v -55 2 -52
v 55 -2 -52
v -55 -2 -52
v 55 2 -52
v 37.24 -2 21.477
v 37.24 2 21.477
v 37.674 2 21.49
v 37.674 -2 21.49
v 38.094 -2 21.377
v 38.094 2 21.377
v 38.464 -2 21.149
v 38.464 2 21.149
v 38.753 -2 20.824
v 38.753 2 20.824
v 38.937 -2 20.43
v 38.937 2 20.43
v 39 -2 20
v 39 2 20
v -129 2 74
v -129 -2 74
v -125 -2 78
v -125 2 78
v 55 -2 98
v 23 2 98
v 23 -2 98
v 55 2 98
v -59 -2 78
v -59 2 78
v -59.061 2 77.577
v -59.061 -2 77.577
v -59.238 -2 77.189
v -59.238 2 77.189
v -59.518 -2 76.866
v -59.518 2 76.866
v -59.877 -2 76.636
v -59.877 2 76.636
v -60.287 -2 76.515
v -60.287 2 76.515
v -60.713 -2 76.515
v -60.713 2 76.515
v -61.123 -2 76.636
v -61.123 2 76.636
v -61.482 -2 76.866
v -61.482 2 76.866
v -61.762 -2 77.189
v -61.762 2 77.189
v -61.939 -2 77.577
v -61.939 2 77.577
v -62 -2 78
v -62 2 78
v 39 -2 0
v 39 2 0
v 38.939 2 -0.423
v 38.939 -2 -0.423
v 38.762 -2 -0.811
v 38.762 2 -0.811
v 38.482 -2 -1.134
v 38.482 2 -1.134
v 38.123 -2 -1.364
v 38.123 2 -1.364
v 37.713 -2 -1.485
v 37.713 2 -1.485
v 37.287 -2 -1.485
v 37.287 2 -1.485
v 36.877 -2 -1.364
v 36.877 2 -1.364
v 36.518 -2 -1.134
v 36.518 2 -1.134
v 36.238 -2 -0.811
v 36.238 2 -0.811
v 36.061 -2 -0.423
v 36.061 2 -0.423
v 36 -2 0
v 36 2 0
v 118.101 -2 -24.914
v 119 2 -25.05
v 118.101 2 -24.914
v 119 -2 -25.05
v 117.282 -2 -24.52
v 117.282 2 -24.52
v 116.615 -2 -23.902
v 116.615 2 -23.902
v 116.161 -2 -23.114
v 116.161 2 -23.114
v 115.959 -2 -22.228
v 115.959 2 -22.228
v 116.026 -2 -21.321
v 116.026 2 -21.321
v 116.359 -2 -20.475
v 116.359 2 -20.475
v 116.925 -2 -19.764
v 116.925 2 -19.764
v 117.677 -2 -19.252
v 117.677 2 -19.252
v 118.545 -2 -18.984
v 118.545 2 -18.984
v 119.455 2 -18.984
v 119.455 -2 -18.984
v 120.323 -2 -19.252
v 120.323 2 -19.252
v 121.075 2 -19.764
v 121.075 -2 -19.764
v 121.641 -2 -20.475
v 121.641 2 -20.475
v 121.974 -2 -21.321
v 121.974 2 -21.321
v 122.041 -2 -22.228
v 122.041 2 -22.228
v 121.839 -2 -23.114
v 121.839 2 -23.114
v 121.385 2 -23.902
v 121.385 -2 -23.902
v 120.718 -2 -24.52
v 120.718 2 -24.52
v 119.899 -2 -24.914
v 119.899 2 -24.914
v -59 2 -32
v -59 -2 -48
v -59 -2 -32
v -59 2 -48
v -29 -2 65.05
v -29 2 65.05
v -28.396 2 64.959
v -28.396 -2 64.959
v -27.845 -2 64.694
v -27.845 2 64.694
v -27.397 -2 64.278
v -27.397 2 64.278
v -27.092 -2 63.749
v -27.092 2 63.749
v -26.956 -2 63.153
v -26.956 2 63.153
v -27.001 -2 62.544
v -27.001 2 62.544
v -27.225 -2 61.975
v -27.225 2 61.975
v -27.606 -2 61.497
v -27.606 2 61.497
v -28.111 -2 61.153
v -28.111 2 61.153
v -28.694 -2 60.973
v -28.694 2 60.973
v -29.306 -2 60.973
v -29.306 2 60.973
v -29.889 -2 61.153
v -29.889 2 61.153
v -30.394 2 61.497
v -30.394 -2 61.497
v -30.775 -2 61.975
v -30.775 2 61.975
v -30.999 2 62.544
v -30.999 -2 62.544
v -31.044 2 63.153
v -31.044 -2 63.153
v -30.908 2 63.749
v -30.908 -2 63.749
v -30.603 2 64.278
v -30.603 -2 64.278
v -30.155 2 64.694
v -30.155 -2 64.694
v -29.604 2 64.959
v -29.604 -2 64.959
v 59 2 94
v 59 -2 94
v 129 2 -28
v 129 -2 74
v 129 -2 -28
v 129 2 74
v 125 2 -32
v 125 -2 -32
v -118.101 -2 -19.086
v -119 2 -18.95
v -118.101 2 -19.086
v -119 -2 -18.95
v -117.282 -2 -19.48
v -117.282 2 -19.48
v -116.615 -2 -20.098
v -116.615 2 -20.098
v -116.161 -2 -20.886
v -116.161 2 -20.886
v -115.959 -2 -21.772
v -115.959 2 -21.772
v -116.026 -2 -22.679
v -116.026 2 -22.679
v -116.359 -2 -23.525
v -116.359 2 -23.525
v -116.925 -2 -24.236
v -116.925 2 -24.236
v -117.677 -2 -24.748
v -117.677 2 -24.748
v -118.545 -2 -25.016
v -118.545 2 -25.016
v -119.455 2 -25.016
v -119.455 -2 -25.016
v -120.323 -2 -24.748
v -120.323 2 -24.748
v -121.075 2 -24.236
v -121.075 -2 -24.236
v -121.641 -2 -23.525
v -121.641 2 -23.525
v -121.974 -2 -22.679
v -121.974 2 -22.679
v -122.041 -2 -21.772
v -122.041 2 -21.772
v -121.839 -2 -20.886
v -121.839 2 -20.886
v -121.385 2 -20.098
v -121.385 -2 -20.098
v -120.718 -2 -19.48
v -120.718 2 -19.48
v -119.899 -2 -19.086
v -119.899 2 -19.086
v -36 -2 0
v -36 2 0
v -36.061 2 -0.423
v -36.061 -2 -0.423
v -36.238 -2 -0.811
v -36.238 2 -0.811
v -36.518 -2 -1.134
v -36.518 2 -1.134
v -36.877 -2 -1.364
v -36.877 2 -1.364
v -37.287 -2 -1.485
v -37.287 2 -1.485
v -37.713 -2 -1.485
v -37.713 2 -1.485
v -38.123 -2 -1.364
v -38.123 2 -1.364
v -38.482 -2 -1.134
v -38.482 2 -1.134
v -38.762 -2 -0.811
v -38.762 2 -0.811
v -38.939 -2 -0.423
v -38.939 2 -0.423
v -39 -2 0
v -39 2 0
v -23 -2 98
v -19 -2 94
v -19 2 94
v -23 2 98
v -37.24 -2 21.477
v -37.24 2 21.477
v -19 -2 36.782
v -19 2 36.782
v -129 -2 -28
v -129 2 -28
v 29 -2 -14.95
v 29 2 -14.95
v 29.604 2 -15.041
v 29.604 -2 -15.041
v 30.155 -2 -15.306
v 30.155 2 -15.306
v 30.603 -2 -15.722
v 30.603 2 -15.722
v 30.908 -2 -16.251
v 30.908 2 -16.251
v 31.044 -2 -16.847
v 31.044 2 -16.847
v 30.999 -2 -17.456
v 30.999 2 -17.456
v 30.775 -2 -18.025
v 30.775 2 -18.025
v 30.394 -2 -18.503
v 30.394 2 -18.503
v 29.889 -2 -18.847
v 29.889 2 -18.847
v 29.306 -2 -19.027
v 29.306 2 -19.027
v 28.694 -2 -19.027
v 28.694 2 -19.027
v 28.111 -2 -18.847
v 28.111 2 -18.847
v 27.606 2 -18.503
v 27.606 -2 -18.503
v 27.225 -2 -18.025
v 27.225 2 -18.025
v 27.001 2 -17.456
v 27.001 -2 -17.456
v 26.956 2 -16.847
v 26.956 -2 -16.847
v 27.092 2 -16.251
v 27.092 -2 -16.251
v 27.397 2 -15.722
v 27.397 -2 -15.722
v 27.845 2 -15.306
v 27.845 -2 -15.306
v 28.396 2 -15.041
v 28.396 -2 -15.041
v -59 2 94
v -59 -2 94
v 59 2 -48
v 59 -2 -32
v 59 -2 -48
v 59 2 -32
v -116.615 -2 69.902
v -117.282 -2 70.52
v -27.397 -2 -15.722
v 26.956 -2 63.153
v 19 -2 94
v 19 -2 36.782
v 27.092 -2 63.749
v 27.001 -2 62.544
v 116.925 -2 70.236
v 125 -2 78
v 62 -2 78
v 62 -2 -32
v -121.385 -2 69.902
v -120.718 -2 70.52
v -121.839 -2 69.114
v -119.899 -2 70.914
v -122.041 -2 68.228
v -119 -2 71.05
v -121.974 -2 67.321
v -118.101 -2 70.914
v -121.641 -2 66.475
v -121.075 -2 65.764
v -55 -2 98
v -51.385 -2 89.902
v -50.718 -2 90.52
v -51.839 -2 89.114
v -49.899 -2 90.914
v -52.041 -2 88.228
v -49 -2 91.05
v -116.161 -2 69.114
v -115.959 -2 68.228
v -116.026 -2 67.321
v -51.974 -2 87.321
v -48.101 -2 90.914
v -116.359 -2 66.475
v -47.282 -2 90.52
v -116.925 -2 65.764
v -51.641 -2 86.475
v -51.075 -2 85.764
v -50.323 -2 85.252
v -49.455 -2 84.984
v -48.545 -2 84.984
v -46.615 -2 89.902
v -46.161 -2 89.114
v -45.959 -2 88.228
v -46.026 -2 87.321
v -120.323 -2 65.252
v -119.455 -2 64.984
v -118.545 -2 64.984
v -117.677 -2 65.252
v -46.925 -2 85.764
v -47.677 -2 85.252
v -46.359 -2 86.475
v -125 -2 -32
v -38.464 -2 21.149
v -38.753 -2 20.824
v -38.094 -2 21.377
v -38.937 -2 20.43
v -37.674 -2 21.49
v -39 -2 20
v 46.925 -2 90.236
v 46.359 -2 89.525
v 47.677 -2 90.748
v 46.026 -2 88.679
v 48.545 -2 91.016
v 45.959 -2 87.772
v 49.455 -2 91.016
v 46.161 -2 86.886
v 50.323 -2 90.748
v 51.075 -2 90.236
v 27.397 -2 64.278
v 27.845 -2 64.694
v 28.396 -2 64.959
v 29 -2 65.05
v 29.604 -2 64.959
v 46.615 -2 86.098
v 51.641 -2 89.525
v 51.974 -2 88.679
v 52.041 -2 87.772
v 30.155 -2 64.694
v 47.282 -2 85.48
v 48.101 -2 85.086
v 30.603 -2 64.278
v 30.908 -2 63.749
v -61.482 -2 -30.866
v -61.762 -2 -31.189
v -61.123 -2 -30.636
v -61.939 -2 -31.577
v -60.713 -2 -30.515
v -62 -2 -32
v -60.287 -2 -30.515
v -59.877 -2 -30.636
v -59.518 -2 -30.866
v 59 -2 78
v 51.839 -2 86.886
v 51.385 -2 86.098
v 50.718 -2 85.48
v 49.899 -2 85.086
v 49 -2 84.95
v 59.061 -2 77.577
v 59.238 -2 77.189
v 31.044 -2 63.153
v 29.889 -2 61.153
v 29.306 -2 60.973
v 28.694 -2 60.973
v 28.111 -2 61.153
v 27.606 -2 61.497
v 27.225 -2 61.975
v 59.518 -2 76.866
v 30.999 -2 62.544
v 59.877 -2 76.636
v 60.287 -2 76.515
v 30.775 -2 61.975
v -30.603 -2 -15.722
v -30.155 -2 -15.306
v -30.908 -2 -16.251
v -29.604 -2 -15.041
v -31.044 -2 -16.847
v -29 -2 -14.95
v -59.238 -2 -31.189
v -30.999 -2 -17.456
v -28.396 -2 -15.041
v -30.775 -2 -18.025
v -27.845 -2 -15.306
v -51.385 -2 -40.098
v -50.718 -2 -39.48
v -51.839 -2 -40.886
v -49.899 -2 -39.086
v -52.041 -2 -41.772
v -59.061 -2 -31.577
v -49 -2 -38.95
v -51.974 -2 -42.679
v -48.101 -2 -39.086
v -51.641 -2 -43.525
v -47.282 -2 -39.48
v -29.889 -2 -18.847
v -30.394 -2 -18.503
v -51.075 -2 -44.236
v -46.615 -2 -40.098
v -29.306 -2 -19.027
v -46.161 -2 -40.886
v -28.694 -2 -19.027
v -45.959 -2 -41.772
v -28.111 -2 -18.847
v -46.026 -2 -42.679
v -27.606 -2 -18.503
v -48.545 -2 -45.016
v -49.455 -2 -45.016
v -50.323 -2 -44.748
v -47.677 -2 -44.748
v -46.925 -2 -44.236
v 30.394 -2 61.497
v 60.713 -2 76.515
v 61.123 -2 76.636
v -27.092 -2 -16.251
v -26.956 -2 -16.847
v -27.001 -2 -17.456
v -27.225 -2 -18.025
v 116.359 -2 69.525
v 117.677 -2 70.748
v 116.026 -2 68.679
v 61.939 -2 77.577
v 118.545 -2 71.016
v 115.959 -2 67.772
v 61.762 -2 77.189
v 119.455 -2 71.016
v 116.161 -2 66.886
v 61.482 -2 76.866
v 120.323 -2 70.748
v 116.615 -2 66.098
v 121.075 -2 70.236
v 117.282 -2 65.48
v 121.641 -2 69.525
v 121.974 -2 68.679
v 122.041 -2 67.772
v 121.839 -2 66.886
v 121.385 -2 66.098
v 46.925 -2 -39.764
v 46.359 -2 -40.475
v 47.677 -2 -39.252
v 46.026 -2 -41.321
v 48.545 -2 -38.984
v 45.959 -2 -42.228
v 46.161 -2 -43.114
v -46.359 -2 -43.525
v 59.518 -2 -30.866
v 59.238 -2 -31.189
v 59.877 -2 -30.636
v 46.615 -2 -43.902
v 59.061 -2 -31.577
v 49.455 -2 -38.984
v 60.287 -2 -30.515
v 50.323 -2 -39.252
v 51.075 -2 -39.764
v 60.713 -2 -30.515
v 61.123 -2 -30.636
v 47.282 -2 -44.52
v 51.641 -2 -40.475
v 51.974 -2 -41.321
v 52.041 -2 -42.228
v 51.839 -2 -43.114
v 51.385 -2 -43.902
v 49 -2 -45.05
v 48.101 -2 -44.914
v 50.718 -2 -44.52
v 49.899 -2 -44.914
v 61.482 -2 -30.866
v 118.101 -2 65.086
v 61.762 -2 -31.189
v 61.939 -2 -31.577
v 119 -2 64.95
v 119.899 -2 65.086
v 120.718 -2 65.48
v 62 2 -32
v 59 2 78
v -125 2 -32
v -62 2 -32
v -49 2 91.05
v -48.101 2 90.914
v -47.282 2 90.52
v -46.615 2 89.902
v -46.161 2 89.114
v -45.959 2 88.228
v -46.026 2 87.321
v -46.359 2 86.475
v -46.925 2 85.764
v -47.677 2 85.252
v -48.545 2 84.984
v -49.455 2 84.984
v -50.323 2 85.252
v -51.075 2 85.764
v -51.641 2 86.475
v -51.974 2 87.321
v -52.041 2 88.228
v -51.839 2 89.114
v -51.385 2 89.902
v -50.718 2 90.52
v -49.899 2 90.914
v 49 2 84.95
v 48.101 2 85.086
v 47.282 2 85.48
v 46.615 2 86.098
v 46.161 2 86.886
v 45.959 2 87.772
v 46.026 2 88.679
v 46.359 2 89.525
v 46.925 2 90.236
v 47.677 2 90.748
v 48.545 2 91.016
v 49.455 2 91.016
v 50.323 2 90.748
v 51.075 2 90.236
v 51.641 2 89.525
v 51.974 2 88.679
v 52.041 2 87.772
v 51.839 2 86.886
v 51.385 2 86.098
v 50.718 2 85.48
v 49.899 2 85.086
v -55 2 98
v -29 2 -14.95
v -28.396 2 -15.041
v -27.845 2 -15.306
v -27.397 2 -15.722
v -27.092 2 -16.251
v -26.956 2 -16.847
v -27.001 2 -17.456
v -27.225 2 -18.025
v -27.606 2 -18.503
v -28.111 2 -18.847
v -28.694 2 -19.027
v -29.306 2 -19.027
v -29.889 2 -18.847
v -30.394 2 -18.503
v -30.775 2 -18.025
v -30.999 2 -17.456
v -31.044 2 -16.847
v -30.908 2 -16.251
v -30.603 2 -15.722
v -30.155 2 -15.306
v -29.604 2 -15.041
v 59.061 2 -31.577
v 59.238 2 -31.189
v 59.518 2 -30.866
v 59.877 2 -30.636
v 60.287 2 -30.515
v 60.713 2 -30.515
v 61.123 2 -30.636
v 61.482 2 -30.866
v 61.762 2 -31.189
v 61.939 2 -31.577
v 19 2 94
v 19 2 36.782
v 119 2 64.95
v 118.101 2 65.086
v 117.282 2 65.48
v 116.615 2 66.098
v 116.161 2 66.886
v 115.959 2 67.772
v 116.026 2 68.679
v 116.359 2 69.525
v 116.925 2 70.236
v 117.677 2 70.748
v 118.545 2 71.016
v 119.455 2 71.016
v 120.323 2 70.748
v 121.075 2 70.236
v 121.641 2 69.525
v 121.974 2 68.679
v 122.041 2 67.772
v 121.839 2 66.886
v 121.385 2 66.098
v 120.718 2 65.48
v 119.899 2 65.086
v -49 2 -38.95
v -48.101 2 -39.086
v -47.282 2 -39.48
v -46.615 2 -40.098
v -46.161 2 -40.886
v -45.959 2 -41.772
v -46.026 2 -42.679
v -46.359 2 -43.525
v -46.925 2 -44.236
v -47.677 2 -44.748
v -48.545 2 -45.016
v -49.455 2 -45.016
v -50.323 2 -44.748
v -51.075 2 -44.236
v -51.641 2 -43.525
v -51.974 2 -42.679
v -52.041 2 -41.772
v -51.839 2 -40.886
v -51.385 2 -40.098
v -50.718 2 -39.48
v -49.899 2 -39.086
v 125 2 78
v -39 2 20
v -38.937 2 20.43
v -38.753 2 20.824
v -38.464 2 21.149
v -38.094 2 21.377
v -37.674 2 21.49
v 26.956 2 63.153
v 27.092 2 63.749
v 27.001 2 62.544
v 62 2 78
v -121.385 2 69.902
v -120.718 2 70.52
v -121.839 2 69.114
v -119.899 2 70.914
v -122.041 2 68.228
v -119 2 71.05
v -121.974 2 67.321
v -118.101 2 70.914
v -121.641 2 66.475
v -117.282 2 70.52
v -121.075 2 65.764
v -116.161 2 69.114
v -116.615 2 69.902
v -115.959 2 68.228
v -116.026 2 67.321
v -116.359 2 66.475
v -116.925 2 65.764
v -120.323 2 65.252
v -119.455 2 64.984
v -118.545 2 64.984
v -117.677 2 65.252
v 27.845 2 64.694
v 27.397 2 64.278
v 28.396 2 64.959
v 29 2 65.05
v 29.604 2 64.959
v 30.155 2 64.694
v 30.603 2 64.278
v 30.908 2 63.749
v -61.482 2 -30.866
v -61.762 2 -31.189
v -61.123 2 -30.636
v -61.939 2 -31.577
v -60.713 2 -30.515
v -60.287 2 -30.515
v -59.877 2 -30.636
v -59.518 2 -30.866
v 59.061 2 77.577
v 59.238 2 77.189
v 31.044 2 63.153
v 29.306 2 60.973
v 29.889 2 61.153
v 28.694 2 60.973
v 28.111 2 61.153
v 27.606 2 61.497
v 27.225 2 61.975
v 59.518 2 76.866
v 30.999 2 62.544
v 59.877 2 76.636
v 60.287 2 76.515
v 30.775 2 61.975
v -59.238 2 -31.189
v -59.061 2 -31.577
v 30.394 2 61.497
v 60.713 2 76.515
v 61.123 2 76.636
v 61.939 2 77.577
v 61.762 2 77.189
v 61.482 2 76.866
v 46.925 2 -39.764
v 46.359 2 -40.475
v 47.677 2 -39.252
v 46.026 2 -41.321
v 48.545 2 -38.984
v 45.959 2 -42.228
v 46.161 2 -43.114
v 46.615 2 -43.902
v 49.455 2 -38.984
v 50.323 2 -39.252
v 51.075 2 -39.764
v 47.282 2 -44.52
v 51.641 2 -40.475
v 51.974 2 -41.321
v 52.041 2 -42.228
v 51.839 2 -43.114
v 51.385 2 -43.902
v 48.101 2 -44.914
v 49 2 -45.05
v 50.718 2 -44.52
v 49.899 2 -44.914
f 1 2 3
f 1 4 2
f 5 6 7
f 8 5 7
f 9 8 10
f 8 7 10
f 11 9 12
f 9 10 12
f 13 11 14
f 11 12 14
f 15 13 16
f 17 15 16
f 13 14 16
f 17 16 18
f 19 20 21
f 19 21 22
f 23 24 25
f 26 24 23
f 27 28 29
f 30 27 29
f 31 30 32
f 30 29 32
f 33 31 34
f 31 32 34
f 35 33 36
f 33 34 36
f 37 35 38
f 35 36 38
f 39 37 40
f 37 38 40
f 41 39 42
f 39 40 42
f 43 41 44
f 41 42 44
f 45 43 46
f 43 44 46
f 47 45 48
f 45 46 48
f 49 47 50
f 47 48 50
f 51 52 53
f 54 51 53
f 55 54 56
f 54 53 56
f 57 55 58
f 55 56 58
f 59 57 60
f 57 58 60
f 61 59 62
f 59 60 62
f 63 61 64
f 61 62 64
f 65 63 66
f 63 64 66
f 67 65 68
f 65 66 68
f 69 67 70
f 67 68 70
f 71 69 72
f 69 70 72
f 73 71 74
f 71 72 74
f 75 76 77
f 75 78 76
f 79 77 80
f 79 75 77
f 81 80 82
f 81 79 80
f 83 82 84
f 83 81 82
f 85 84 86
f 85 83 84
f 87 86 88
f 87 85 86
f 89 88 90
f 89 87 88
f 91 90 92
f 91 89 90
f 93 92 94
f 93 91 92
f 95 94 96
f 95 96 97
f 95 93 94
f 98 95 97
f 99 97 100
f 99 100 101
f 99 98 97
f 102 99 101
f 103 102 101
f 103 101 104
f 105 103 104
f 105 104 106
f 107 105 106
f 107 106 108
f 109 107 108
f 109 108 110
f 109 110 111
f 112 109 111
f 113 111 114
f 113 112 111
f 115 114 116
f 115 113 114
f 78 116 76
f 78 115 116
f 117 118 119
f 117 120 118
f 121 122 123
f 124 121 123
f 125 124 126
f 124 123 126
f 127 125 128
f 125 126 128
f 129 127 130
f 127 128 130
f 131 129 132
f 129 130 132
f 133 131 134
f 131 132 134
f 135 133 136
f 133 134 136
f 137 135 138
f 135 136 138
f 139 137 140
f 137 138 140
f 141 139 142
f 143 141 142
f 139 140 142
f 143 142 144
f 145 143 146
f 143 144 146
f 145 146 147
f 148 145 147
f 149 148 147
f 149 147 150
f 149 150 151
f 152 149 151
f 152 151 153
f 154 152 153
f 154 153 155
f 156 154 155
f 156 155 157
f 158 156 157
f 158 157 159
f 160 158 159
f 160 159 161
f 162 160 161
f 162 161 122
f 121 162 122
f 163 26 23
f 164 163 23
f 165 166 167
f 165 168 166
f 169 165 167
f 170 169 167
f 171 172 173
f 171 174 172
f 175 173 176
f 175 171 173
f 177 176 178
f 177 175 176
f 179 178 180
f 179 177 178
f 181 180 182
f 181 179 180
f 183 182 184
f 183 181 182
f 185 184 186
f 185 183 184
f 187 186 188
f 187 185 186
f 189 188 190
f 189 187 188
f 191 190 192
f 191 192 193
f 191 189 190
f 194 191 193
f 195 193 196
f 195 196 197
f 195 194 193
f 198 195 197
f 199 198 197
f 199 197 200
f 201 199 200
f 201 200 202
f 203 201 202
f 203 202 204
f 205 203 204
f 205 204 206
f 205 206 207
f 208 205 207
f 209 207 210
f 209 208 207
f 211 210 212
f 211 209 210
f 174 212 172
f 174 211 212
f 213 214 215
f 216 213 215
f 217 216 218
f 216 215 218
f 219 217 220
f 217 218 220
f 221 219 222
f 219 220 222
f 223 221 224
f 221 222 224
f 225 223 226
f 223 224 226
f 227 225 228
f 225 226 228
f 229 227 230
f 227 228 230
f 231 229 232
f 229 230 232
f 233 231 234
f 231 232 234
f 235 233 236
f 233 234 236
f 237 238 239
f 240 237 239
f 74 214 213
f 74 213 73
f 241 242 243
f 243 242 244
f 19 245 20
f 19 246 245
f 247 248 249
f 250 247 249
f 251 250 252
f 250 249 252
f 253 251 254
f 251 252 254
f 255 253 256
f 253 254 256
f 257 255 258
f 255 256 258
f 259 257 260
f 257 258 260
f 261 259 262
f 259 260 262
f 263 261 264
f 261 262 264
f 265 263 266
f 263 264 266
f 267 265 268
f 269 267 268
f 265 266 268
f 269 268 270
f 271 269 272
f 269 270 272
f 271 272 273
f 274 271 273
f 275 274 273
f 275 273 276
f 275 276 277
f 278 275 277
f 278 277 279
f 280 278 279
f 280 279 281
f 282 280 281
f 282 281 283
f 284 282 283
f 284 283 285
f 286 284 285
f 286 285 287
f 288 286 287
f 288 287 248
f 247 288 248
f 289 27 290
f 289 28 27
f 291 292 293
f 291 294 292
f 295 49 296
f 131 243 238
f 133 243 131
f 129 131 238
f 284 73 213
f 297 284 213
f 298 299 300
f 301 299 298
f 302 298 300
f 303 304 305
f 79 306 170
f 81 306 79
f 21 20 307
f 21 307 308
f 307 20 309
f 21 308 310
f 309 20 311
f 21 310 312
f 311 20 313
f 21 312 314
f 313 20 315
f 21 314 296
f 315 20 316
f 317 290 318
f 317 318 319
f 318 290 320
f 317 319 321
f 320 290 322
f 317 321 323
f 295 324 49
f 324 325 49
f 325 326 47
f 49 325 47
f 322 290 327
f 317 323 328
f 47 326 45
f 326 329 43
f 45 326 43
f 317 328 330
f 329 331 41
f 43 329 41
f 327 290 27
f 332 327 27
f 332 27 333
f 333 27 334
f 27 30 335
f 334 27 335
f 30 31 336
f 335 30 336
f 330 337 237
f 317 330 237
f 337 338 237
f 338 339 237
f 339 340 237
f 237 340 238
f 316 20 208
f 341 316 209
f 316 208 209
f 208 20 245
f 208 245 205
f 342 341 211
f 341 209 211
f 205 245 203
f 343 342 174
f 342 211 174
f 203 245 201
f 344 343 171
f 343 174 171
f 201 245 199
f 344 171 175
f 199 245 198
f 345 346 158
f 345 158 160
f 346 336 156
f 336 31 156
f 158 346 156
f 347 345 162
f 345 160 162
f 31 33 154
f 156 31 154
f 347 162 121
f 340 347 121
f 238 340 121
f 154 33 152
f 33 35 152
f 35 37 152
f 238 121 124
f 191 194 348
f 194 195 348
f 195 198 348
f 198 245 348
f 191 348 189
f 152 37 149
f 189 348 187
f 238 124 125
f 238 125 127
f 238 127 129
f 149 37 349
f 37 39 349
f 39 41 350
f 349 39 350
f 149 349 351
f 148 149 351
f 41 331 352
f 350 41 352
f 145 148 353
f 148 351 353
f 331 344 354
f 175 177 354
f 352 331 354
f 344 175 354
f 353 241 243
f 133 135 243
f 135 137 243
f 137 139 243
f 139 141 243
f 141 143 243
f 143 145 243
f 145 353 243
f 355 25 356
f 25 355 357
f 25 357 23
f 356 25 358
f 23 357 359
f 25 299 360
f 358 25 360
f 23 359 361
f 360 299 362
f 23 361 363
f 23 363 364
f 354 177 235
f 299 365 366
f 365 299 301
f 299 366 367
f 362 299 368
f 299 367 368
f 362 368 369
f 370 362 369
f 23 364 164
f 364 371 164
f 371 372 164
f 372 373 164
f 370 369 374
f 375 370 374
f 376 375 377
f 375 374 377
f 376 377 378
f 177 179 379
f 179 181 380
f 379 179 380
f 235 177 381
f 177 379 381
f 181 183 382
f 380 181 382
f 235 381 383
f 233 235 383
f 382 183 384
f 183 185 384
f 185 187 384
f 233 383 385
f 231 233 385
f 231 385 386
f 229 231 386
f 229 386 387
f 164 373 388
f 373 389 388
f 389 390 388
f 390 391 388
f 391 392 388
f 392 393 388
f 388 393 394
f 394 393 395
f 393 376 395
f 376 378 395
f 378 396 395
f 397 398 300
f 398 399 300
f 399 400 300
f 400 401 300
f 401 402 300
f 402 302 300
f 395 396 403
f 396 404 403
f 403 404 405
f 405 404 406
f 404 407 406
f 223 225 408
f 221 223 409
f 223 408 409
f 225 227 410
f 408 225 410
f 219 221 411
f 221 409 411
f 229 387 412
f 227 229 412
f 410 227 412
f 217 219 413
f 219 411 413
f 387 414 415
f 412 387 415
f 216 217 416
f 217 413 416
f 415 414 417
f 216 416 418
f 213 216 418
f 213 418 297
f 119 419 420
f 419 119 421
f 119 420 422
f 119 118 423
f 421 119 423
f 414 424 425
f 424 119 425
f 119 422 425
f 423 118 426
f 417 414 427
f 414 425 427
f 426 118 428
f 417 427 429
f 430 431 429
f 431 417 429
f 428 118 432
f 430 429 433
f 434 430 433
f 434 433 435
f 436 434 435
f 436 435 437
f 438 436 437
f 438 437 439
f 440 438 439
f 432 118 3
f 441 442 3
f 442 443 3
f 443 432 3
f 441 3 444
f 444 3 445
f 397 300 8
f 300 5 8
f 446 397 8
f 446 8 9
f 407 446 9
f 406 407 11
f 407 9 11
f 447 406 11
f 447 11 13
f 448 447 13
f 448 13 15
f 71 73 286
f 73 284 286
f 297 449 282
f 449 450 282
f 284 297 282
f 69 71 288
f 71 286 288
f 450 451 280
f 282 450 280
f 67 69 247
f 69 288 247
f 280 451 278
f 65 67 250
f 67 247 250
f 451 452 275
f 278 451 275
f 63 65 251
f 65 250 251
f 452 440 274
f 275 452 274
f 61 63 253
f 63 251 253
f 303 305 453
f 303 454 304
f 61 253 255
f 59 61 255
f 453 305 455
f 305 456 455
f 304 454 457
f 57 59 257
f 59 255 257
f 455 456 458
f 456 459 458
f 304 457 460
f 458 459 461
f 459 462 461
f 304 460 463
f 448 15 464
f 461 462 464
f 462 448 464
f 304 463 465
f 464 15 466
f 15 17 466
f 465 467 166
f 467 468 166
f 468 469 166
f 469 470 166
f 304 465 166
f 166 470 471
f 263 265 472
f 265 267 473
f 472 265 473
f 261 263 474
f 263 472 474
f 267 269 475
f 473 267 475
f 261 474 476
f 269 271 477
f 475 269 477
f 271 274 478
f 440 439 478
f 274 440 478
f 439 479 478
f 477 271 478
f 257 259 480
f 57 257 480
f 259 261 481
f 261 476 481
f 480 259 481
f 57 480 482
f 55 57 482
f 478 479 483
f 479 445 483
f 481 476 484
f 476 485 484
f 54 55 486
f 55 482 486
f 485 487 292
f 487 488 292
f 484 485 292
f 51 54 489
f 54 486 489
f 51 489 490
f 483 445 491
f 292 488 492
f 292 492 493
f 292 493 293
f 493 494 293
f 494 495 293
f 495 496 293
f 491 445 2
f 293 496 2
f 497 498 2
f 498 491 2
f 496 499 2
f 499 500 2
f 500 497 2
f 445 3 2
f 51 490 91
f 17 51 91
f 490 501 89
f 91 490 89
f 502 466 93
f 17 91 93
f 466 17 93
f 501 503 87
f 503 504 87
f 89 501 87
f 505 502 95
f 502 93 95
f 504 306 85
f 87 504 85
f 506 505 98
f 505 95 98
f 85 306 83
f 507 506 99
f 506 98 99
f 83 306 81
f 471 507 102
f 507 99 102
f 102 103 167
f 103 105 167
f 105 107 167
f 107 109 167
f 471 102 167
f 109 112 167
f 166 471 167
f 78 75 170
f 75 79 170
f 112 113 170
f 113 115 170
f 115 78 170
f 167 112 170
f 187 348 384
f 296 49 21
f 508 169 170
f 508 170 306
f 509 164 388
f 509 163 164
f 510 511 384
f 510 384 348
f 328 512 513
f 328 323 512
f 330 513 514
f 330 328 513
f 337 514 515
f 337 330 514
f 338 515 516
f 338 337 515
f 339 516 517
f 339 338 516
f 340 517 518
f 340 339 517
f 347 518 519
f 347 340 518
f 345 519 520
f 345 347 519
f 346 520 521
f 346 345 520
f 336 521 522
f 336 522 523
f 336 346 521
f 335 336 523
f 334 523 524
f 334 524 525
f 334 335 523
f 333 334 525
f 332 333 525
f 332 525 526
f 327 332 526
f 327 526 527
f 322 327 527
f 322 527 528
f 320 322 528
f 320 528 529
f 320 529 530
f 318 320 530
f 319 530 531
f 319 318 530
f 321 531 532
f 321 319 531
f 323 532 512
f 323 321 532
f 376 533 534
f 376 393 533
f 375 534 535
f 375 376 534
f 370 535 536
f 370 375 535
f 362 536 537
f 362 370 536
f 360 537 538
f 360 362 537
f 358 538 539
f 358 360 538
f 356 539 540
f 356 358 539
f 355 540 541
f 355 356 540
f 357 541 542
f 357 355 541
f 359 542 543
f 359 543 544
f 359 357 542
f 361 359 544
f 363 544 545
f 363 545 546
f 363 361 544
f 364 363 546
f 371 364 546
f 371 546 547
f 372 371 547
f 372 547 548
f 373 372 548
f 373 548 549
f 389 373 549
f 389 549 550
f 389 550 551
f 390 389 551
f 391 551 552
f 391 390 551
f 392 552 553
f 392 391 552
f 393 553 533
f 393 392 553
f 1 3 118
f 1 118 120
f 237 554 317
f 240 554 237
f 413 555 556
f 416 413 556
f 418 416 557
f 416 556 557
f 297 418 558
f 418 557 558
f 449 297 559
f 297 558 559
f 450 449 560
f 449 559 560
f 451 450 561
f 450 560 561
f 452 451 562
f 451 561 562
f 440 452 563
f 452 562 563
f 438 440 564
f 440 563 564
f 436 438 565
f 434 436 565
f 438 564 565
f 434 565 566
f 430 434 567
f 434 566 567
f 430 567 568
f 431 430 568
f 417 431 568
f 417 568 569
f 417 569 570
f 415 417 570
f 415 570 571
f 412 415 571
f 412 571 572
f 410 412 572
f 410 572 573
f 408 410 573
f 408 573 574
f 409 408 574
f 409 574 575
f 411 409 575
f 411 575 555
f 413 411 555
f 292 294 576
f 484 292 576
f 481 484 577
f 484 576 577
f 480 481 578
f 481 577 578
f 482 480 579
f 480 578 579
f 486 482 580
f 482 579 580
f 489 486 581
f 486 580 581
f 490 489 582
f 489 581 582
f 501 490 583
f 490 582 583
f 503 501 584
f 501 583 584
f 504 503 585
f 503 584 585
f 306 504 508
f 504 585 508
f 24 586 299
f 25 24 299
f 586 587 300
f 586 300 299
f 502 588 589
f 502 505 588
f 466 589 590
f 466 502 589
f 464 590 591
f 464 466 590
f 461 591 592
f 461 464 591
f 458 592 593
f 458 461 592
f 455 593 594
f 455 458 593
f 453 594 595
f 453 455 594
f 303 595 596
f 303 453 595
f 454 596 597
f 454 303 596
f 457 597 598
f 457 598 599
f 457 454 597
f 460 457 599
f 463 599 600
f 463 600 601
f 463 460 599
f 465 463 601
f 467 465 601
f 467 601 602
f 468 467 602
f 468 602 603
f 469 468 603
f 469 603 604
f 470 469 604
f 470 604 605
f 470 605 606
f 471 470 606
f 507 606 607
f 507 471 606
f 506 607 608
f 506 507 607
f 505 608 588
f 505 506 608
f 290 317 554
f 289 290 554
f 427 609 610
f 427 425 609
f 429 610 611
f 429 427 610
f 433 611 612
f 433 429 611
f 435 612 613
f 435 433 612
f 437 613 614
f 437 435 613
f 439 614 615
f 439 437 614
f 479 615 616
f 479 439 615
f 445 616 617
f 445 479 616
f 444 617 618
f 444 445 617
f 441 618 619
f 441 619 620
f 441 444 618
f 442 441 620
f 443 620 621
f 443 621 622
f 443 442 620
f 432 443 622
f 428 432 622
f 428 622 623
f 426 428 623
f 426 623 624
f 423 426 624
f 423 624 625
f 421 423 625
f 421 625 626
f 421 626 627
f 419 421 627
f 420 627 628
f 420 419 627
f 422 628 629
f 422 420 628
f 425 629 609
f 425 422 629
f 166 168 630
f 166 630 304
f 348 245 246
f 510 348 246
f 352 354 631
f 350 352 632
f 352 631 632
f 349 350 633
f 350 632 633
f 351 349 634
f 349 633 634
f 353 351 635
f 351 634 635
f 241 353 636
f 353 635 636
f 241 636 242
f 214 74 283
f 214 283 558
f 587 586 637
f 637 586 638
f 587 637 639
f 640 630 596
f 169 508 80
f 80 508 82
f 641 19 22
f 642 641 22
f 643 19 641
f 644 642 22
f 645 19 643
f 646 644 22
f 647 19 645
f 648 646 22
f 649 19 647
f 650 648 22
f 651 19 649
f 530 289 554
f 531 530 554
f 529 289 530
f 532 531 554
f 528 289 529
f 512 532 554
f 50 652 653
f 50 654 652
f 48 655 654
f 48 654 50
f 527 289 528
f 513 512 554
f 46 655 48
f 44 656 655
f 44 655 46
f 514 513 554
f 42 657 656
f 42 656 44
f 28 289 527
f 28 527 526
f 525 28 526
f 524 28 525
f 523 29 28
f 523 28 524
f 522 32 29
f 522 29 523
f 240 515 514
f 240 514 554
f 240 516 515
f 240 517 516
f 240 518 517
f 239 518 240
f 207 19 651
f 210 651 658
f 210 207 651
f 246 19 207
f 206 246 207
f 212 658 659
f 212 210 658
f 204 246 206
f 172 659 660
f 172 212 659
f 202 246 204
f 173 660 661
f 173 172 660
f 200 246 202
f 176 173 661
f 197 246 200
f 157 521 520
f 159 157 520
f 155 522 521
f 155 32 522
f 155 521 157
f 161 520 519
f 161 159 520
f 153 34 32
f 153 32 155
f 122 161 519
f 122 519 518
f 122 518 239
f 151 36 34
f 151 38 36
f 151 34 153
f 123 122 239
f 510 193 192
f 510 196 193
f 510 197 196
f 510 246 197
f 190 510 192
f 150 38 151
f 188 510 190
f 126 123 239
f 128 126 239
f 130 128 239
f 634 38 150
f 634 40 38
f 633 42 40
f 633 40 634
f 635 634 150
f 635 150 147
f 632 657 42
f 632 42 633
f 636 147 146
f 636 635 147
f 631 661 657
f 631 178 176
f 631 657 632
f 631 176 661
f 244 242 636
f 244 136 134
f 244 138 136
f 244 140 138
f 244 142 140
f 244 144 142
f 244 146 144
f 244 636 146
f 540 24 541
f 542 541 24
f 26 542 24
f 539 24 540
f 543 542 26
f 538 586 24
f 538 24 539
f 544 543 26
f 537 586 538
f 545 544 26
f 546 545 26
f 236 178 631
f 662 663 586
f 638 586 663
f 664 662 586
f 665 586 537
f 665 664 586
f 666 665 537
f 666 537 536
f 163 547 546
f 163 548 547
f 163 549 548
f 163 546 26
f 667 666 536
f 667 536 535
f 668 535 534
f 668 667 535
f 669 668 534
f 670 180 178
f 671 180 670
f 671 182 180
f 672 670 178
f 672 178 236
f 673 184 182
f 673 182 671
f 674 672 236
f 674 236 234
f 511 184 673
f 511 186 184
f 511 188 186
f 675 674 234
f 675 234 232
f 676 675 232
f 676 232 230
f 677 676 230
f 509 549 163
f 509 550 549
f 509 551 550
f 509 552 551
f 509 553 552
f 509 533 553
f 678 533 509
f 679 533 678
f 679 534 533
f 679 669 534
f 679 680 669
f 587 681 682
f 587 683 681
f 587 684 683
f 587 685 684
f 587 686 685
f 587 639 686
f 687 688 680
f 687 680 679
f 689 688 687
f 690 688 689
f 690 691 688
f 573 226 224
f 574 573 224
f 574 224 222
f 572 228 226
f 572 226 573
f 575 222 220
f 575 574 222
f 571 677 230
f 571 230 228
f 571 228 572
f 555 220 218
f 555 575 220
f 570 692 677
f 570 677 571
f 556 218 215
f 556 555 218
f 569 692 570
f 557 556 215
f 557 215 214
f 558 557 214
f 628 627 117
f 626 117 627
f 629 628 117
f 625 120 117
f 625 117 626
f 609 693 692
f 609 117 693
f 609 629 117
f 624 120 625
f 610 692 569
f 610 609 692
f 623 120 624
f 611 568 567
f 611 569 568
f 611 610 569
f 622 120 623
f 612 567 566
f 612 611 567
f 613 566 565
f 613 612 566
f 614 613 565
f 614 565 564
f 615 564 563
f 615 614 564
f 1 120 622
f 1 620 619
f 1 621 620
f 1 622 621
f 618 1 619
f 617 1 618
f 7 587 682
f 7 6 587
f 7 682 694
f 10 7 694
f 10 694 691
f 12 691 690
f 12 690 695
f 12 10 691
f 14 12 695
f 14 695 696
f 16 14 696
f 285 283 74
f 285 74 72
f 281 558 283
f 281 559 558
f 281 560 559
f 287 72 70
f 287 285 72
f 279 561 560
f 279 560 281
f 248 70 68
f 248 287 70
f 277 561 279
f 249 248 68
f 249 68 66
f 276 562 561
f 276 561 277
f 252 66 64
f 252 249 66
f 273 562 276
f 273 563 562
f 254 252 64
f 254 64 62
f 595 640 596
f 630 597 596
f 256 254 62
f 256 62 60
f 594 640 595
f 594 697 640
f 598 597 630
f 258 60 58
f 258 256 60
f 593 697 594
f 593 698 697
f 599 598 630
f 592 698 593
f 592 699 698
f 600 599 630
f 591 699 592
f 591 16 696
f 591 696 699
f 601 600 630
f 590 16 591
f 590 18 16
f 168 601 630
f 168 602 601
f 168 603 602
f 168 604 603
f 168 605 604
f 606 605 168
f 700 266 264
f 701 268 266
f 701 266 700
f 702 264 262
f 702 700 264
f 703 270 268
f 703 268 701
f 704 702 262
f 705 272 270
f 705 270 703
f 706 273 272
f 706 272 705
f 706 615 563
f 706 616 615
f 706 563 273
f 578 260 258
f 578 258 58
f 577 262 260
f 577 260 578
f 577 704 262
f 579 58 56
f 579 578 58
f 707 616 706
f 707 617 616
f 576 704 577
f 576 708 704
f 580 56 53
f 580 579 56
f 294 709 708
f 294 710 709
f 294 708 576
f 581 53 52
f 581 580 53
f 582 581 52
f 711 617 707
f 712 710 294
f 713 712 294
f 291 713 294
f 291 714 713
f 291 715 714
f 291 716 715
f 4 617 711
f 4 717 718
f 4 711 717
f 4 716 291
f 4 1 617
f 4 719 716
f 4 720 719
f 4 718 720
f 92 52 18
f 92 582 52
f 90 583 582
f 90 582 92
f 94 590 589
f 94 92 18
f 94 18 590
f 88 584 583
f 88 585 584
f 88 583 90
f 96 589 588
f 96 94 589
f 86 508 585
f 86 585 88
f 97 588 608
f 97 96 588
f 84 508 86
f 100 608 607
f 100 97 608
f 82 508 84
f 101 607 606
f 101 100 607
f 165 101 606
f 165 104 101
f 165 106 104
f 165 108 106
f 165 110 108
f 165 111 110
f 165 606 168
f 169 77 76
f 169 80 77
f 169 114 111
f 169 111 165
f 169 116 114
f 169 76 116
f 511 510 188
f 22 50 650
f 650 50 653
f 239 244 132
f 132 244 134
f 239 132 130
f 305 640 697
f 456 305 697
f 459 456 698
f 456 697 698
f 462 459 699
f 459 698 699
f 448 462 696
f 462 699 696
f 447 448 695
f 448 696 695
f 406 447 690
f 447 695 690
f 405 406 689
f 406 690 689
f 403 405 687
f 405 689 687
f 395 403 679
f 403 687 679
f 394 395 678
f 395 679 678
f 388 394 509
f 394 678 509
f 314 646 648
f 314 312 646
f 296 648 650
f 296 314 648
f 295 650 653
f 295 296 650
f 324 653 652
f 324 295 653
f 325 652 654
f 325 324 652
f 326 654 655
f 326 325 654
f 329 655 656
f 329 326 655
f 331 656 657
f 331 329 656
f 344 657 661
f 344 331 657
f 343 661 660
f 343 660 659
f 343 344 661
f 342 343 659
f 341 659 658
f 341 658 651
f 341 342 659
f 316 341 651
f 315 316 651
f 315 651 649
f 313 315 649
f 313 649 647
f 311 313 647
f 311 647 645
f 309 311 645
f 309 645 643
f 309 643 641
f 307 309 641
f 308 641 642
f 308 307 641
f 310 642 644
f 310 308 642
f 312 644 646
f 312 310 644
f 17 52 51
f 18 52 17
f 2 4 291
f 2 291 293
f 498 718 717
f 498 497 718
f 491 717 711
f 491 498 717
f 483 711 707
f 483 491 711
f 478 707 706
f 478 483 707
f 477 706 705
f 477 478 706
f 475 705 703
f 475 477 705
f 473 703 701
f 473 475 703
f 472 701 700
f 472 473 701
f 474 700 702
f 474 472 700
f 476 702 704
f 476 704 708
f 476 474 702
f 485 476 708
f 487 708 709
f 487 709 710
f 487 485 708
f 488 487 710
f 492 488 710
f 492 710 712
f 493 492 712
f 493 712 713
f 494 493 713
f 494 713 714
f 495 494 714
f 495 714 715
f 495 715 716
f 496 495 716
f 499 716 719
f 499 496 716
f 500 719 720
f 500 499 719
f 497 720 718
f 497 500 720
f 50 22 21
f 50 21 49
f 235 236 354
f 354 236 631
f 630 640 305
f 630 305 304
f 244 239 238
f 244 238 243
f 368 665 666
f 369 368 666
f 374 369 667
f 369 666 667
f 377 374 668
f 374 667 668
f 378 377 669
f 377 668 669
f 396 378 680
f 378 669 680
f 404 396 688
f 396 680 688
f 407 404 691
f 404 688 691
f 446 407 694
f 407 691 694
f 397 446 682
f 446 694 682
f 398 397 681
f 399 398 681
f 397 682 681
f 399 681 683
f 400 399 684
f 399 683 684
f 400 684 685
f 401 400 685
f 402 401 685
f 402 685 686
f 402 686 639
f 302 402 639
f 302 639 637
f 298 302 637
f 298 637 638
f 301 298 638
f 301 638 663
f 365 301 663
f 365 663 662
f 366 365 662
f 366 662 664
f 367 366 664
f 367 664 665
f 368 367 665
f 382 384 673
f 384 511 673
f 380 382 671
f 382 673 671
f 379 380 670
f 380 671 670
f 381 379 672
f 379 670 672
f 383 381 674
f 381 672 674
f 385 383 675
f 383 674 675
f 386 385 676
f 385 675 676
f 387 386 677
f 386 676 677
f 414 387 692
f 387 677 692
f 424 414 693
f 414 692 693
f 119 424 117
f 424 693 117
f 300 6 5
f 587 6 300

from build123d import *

# Parameters (mm, degrees)
SKETCH_1_R          = 3.05
EXTRUDE_1_DEPTH     = 2
CUT_EXTRUDE_1_DEPTH = 163.052460642
SKETCH_3_R          = 1.5
CUT_EXTRUDE_2_DEPTH = 163.052460642
SKETCH_4_R          = 2.05
CUT_EXTRUDE_3_DEPTH = 163.052460642
CHAMFER_1_SIZE      = 4


with BuildPart() as part:
    # 草图1 → 凸台-拉伸1 (new, symmetric)
    with BuildSketch(Plane(origin=(0, 0, 0), x_dir=(1, 0, 0), z_dir=(0, 1, 0))):
        Polygon((59, 52), (-59, 52), (-59, 32), (-129, 32), (-129, -78), (-59, -78), (-59, -98), (-19, -98), (-19, 0), (19, 0), (19, -98), (59, -98), (59, -78), (129, -78), (129, 32), (59, 32), align=None)
        with Locations(Location((-49, 42, 0), (0, 0, 270))):
            Circle(SKETCH_1_R, mode=Mode.SUBTRACT)
        with Locations(Location((-119, 22, 0), (0, 0, 270))):
            Circle(SKETCH_1_R, mode=Mode.SUBTRACT)
        with Locations(Location((-119, -68, 0), (0, 0, 270))):
            Circle(SKETCH_1_R, mode=Mode.SUBTRACT)
        with Locations(Location((-49, -88, 0), (0, 0, 270))):
            Circle(SKETCH_1_R, mode=Mode.SUBTRACT)
        with Locations(Location((49, -88, 0), (0, 0, 90))):
            Circle(SKETCH_1_R, mode=Mode.SUBTRACT)
        with Locations(Location((119, -68, 0), (0, 0, 90))):
            Circle(SKETCH_1_R, mode=Mode.SUBTRACT)
        with Locations(Location((119, 22, 0), (0, 0, 90))):
            Circle(SKETCH_1_R, mode=Mode.SUBTRACT)
        with Locations(Location((49, 42, 0), (0, 0, 90))):
            Circle(SKETCH_1_R, mode=Mode.SUBTRACT)
    extrude(amount=EXTRUDE_1_DEPTH, both=True)

    # 草图2 → 切除-拉伸1 (cut, through all)
    with BuildSketch(Plane(origin=(0, 2, 0), x_dir=(1, 0, 0), z_dir=(0, 1, 0))):
        Polygon((-19, 0), (-39, 0), (-39, -20), (-19, -36.781992624), align=None)
        Polygon((39, -20), (19, -36.781992624), (19, 0), (39, 0), align=None)
    extrude(amount=-CUT_EXTRUDE_1_DEPTH, mode=Mode.SUBTRACT)

    # 草图3 → 切除-拉伸2 (cut, through all)
    with BuildSketch(Plane(origin=(0, 2, 0), x_dir=(1, 0, 0), z_dir=(0, 1, 0))):
        with Locations((-37.5, 0)):
            Circle(SKETCH_3_R)
        with Locations((-37.5, -20)):
            Circle(SKETCH_3_R)
        with Locations((37.5, -20)):
            Circle(SKETCH_3_R)
        with Locations((37.5, 0)):
            Circle(SKETCH_3_R)
        with Locations((-60.5, 32)):
            Circle(SKETCH_3_R)
        with Locations((-60.5, -78)):
            Circle(SKETCH_3_R)
        with Locations((60.5, -78)):
            Circle(SKETCH_3_R)
        with Locations((60.5, 32)):
            Circle(SKETCH_3_R)
    extrude(amount=-CUT_EXTRUDE_2_DEPTH, mode=Mode.SUBTRACT)

    # 草图4 → 切除-拉伸3 (cut, through all)
    with BuildSketch(Plane(origin=(0, 2, 0), x_dir=(1, 0, 0), z_dir=(0, 1, 0))):
        with Locations(Location((-29, -63, 0), (0, 0, 270))):
            Circle(SKETCH_4_R)
        with Locations(Location((29, -63, 0), (0, 0, 270))):
            Circle(SKETCH_4_R)
        with Locations(Location((29, 17, 0), (0, 0, 270))):
            Circle(SKETCH_4_R)
        with Locations(Location((-29, 17, 0), (0, 0, 270))):
            Circle(SKETCH_4_R)
    extrude(amount=-CUT_EXTRUDE_3_DEPTH, mode=Mode.SUBTRACT)

    # 倒角1
    chamfer_1_edges = [part.edges().sort_by_distance(p)[0] for p in [
        (-129, 0, 78),
        (-129, 0, -32),
        (-59, 0, -52),
        (59, 0, -52),
        (129, 0, -32),
        (129, 0, 78),
        (59, 0, 98),
        (19, 0, 98),
        (-19, 0, 98),
        (-59, 0, 98),
    ]]
    chamfer(chamfer_1_edges, length=CHAMFER_1_SIZE)


solid = part.part
